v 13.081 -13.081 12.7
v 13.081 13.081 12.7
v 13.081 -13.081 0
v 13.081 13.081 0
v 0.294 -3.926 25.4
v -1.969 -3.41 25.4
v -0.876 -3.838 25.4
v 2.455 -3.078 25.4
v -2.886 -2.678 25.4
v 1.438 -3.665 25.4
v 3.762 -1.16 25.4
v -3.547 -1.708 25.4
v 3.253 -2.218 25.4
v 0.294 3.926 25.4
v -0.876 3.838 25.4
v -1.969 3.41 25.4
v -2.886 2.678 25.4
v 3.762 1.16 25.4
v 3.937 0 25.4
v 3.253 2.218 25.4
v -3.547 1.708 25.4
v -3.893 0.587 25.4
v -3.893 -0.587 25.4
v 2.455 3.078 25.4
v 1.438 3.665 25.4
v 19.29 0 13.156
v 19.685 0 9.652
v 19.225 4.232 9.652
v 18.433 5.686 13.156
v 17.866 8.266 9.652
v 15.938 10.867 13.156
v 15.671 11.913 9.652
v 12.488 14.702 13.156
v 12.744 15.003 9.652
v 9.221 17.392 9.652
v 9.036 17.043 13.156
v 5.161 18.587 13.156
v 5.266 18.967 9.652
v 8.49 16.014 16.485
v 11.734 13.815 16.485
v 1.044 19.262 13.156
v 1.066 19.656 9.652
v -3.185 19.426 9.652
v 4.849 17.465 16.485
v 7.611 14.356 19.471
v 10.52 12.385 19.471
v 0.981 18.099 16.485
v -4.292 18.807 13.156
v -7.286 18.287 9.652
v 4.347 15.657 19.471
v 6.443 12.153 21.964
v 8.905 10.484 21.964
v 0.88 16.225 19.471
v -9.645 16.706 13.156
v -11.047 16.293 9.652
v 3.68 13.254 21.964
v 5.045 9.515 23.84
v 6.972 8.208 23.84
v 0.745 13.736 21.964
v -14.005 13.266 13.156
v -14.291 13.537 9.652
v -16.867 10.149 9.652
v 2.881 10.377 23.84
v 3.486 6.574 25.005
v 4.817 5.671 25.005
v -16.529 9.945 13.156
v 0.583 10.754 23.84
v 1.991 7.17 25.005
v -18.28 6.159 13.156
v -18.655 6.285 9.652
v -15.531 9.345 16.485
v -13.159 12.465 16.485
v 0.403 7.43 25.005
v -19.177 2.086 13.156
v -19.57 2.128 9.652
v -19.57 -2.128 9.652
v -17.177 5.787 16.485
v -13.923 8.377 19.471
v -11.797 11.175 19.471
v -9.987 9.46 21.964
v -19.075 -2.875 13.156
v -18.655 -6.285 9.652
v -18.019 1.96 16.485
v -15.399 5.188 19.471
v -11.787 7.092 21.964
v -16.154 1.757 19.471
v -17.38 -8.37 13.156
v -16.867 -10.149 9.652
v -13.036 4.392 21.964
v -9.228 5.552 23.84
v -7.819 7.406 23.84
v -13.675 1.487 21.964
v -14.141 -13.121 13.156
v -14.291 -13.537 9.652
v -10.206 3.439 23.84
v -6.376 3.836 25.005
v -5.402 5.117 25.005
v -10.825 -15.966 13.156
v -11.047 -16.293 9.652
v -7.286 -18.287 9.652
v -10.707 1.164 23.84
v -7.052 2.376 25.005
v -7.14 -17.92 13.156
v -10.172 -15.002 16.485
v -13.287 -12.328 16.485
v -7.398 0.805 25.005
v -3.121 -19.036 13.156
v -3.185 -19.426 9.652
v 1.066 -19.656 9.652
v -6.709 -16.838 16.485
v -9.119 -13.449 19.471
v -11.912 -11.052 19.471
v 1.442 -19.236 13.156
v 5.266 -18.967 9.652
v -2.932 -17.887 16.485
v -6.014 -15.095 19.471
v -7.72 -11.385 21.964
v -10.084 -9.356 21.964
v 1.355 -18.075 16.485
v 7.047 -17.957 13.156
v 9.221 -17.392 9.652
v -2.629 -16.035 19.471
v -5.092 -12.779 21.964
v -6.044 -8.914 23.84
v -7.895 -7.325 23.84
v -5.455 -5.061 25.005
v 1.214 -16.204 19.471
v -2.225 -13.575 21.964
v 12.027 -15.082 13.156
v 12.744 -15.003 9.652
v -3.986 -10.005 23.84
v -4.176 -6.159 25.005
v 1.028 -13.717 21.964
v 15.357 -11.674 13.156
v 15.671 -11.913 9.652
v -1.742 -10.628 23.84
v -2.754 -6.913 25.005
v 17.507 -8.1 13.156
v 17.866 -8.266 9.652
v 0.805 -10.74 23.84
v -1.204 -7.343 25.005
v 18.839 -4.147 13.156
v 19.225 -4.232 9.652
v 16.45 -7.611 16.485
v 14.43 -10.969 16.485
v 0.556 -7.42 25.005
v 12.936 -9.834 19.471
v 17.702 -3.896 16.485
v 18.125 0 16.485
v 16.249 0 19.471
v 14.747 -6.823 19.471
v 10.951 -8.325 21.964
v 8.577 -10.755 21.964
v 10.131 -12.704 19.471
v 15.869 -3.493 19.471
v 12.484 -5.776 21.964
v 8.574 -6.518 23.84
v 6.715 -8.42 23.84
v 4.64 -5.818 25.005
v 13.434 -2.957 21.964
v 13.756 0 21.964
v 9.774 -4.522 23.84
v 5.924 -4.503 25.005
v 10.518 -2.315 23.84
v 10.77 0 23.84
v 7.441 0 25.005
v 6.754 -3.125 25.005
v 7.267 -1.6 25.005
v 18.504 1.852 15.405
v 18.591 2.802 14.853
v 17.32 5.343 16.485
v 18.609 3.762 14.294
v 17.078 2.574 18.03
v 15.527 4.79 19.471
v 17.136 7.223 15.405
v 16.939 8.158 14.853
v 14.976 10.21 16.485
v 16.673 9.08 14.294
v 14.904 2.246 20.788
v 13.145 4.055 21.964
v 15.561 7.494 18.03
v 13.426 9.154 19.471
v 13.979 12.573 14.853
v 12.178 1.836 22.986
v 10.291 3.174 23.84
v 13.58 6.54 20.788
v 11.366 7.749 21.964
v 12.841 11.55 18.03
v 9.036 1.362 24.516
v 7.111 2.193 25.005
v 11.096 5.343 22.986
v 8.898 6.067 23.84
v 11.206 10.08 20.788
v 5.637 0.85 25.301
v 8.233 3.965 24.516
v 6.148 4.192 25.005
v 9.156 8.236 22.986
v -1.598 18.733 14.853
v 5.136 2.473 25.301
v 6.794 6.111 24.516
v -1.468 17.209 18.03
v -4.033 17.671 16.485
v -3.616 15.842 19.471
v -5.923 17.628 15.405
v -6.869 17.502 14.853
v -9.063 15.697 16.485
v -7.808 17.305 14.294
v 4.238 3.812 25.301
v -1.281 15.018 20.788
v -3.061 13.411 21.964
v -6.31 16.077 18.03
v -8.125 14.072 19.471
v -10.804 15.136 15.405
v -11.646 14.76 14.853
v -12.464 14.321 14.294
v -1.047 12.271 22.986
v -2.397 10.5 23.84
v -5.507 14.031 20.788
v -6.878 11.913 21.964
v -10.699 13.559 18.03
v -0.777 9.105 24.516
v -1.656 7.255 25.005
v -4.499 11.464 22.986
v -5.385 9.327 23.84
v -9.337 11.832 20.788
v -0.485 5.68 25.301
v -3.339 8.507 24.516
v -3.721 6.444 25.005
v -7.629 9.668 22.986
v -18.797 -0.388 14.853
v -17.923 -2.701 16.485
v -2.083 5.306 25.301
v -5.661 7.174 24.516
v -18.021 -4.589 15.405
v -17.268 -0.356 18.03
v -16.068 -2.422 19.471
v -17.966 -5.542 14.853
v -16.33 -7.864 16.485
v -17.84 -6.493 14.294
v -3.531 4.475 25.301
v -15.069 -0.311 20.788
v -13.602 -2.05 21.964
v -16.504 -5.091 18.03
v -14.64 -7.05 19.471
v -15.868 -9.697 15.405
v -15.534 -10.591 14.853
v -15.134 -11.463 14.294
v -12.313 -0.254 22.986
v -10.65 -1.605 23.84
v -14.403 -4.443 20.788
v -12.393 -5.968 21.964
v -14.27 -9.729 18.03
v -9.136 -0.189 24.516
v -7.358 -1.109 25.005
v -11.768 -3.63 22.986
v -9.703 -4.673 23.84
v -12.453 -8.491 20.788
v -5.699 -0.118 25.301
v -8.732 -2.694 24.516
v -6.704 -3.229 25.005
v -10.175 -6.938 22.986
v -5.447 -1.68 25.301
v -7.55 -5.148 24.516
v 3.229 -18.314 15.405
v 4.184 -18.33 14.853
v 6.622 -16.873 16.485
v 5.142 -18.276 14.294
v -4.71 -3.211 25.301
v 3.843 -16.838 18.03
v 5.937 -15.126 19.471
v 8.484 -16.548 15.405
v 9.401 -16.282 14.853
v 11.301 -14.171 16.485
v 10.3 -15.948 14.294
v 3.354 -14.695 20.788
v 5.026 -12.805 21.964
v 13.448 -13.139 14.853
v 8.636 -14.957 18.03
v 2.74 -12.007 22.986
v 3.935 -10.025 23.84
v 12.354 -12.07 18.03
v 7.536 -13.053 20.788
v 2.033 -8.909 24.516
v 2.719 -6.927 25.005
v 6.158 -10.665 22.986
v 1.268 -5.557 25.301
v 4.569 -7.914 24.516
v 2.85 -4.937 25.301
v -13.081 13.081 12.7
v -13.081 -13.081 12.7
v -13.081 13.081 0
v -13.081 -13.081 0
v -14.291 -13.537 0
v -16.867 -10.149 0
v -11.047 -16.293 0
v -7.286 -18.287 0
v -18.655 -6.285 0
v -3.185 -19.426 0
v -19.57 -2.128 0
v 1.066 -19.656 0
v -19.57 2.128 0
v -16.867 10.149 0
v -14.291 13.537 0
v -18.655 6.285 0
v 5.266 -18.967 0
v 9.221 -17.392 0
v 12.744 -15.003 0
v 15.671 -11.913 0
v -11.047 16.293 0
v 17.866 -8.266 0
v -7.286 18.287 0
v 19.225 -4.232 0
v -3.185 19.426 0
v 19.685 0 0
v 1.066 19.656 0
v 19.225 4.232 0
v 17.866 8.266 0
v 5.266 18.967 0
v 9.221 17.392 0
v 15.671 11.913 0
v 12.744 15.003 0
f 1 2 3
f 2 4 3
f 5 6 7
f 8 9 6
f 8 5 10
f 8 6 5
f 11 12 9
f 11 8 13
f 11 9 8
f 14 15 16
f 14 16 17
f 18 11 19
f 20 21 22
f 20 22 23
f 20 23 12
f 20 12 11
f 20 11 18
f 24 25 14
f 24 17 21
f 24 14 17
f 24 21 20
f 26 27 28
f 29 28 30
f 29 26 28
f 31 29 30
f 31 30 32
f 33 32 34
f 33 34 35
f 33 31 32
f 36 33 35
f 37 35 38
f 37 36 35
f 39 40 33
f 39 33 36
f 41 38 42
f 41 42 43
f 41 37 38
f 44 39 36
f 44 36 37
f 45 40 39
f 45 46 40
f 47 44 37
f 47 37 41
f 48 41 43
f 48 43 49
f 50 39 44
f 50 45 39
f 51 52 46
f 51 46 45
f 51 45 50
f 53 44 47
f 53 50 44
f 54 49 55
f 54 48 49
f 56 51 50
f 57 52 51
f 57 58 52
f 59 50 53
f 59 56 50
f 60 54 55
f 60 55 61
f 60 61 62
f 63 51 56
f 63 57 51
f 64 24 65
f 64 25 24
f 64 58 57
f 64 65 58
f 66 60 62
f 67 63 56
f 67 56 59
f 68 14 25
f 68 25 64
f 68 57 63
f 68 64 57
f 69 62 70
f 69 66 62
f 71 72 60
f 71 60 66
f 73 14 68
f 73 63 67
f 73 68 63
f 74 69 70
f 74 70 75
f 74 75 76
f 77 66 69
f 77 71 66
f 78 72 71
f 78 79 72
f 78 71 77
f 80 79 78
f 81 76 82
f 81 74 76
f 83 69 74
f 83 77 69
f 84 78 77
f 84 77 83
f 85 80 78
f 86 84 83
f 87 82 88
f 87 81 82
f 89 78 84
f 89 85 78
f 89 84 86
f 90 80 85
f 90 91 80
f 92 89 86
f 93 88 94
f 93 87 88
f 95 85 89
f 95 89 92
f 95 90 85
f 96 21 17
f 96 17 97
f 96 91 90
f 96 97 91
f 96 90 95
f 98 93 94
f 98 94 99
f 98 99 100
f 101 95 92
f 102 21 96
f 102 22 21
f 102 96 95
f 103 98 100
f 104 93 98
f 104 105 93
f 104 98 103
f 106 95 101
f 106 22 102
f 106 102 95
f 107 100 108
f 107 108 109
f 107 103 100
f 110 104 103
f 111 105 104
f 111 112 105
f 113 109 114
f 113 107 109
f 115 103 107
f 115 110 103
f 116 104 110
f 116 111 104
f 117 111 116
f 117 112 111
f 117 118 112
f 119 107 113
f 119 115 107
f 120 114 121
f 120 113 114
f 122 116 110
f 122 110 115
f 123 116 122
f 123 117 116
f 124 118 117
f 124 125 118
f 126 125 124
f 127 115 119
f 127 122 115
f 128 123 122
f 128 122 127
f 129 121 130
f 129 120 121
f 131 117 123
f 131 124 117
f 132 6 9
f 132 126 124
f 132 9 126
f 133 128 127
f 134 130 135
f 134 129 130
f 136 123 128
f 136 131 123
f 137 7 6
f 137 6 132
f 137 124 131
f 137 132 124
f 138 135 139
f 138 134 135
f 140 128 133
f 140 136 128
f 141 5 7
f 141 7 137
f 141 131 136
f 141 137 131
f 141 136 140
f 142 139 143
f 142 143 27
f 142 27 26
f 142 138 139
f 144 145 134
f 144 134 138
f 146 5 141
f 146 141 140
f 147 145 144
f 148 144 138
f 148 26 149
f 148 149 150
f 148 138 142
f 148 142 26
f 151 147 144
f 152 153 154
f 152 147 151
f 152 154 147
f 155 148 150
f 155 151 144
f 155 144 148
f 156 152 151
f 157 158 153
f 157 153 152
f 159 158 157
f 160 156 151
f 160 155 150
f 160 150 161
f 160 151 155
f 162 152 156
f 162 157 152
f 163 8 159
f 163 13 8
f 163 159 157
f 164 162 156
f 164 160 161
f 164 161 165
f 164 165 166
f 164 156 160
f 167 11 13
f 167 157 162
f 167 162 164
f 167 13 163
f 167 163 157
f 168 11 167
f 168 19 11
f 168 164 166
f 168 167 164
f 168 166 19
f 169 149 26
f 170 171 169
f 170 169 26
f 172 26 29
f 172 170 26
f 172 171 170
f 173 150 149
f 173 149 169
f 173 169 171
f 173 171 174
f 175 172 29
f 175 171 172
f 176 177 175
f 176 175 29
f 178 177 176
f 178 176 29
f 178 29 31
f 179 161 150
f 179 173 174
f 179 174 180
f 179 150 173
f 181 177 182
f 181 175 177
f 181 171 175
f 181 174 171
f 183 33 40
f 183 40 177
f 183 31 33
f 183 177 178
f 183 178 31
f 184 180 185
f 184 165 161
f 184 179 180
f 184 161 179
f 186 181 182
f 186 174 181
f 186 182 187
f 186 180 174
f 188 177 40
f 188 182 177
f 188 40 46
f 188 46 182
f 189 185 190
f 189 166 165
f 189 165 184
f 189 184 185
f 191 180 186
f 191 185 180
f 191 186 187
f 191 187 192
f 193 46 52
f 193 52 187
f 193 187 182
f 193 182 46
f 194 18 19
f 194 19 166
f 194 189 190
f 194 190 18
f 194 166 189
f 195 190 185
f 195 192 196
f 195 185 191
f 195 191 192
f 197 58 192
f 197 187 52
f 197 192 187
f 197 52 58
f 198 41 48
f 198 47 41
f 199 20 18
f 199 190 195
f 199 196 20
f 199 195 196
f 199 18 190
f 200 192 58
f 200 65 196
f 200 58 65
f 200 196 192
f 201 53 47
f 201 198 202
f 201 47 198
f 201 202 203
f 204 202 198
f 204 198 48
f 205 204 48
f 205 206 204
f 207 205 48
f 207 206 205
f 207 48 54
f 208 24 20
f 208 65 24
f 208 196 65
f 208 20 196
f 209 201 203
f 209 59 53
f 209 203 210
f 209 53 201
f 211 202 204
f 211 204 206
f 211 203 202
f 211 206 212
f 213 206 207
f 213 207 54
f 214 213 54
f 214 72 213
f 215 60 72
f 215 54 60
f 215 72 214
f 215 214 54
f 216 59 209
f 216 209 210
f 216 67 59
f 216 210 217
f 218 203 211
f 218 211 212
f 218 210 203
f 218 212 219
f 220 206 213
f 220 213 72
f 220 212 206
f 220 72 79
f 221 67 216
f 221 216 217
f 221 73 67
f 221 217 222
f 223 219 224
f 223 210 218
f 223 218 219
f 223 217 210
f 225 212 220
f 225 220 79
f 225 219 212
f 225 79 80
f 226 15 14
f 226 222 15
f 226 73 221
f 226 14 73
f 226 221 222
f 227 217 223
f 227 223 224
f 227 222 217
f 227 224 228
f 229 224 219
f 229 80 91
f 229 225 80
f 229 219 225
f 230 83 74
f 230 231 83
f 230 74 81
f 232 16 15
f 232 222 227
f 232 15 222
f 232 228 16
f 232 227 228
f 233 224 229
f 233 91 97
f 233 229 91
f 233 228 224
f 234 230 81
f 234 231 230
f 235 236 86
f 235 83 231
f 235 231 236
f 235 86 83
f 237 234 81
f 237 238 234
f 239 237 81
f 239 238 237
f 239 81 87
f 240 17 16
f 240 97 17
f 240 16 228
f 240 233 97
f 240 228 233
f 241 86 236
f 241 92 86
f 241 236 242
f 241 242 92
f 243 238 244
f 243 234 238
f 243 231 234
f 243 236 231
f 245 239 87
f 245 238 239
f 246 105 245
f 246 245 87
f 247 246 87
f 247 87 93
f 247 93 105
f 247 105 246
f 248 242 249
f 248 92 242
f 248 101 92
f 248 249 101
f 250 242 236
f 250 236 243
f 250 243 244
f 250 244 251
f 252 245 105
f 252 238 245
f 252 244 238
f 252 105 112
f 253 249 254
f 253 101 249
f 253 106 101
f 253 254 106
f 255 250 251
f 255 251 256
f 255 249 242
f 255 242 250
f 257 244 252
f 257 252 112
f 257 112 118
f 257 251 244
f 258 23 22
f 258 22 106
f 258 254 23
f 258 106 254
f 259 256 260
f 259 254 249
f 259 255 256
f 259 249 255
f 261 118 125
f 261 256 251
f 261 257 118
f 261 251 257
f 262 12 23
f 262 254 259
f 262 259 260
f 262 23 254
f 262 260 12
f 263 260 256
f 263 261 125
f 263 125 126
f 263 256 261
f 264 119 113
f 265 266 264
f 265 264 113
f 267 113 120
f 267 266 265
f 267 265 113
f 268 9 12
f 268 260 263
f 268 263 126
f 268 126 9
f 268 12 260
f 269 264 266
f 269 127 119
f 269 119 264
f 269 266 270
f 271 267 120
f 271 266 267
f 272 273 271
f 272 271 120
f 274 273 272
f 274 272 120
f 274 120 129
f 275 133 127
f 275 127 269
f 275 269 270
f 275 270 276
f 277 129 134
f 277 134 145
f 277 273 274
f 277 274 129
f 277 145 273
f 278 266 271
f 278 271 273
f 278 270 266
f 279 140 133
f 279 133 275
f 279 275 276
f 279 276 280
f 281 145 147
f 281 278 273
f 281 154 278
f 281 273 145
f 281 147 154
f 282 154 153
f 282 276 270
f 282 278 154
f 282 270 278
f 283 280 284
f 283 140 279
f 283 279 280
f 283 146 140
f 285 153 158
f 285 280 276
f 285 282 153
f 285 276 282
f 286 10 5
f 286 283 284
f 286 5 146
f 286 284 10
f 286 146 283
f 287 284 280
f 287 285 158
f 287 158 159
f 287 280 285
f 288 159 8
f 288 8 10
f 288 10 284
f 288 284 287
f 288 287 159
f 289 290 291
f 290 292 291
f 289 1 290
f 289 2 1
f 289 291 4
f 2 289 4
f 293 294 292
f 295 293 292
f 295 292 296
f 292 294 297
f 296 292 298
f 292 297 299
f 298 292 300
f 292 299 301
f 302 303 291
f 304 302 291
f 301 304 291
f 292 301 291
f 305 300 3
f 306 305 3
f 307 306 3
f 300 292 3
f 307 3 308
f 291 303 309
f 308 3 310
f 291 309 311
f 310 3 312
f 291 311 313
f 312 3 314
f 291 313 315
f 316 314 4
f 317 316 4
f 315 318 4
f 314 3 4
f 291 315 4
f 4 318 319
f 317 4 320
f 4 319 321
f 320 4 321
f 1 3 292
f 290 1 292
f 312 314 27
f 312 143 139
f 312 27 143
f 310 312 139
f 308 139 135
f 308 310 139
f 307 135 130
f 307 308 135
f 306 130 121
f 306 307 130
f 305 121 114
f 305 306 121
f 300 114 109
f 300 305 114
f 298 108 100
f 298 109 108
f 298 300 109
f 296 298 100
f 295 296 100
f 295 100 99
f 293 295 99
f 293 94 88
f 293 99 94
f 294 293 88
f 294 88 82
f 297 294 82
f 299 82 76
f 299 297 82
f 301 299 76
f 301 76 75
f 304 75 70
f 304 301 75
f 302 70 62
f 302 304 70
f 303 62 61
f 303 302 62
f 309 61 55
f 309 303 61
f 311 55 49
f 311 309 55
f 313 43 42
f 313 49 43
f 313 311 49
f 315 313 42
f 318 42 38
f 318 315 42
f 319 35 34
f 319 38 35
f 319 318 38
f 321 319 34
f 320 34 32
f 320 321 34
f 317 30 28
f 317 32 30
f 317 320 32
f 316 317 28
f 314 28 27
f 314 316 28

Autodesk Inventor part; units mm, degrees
ref_plane "YZ Plane" through (0, 0, 0) normal (1, 0, 0) x (0, 1, 0)
ref_plane "XZ Plane" through (0, 0, 0) normal (0, 1, 0) x (-1, 0, 0)
ref_plane "XY Plane" through (0, 0, 0) normal (0, 0, 1) x (1, 0, 0)
sketch "Sketch1" plane through (0, 0, 0) normal (0, 0, 1) x (1, 0, 0)
  circle A0 centre (0, 0) radius 19.685
  dimension "d0" = 39.37
extrude "Extrusion1" add sketch "Sketch1" along normal blind 25.4
fillet "Fillet1" radius 15.748 1 edges at (-19.685, 0, 25.4)
sketch "Sketch2" plane through (0, 0, 0) normal (0, 0, -1) x (-1, 0, 0)
  line L0 (-13.081, -13.081) -> (13.081, -13.081)
  line L1 (13.081, -13.081) -> (13.081, 13.081)
  line L2 (13.081, 13.081) -> (-13.081, 13.081)
  line L3 (-13.081, 13.081) -> (-13.081, -13.081)
  point P0 (0, 0)
  dimension "d4" = 26.162
  dimension "d5" = 26.162
  dimension "d6" = 13.081
  dimension "d8" = 13.081
extrude "Extrusion2" cut sketch "Sketch2" against normal blind 12.7
properties part number "SharpCap"
